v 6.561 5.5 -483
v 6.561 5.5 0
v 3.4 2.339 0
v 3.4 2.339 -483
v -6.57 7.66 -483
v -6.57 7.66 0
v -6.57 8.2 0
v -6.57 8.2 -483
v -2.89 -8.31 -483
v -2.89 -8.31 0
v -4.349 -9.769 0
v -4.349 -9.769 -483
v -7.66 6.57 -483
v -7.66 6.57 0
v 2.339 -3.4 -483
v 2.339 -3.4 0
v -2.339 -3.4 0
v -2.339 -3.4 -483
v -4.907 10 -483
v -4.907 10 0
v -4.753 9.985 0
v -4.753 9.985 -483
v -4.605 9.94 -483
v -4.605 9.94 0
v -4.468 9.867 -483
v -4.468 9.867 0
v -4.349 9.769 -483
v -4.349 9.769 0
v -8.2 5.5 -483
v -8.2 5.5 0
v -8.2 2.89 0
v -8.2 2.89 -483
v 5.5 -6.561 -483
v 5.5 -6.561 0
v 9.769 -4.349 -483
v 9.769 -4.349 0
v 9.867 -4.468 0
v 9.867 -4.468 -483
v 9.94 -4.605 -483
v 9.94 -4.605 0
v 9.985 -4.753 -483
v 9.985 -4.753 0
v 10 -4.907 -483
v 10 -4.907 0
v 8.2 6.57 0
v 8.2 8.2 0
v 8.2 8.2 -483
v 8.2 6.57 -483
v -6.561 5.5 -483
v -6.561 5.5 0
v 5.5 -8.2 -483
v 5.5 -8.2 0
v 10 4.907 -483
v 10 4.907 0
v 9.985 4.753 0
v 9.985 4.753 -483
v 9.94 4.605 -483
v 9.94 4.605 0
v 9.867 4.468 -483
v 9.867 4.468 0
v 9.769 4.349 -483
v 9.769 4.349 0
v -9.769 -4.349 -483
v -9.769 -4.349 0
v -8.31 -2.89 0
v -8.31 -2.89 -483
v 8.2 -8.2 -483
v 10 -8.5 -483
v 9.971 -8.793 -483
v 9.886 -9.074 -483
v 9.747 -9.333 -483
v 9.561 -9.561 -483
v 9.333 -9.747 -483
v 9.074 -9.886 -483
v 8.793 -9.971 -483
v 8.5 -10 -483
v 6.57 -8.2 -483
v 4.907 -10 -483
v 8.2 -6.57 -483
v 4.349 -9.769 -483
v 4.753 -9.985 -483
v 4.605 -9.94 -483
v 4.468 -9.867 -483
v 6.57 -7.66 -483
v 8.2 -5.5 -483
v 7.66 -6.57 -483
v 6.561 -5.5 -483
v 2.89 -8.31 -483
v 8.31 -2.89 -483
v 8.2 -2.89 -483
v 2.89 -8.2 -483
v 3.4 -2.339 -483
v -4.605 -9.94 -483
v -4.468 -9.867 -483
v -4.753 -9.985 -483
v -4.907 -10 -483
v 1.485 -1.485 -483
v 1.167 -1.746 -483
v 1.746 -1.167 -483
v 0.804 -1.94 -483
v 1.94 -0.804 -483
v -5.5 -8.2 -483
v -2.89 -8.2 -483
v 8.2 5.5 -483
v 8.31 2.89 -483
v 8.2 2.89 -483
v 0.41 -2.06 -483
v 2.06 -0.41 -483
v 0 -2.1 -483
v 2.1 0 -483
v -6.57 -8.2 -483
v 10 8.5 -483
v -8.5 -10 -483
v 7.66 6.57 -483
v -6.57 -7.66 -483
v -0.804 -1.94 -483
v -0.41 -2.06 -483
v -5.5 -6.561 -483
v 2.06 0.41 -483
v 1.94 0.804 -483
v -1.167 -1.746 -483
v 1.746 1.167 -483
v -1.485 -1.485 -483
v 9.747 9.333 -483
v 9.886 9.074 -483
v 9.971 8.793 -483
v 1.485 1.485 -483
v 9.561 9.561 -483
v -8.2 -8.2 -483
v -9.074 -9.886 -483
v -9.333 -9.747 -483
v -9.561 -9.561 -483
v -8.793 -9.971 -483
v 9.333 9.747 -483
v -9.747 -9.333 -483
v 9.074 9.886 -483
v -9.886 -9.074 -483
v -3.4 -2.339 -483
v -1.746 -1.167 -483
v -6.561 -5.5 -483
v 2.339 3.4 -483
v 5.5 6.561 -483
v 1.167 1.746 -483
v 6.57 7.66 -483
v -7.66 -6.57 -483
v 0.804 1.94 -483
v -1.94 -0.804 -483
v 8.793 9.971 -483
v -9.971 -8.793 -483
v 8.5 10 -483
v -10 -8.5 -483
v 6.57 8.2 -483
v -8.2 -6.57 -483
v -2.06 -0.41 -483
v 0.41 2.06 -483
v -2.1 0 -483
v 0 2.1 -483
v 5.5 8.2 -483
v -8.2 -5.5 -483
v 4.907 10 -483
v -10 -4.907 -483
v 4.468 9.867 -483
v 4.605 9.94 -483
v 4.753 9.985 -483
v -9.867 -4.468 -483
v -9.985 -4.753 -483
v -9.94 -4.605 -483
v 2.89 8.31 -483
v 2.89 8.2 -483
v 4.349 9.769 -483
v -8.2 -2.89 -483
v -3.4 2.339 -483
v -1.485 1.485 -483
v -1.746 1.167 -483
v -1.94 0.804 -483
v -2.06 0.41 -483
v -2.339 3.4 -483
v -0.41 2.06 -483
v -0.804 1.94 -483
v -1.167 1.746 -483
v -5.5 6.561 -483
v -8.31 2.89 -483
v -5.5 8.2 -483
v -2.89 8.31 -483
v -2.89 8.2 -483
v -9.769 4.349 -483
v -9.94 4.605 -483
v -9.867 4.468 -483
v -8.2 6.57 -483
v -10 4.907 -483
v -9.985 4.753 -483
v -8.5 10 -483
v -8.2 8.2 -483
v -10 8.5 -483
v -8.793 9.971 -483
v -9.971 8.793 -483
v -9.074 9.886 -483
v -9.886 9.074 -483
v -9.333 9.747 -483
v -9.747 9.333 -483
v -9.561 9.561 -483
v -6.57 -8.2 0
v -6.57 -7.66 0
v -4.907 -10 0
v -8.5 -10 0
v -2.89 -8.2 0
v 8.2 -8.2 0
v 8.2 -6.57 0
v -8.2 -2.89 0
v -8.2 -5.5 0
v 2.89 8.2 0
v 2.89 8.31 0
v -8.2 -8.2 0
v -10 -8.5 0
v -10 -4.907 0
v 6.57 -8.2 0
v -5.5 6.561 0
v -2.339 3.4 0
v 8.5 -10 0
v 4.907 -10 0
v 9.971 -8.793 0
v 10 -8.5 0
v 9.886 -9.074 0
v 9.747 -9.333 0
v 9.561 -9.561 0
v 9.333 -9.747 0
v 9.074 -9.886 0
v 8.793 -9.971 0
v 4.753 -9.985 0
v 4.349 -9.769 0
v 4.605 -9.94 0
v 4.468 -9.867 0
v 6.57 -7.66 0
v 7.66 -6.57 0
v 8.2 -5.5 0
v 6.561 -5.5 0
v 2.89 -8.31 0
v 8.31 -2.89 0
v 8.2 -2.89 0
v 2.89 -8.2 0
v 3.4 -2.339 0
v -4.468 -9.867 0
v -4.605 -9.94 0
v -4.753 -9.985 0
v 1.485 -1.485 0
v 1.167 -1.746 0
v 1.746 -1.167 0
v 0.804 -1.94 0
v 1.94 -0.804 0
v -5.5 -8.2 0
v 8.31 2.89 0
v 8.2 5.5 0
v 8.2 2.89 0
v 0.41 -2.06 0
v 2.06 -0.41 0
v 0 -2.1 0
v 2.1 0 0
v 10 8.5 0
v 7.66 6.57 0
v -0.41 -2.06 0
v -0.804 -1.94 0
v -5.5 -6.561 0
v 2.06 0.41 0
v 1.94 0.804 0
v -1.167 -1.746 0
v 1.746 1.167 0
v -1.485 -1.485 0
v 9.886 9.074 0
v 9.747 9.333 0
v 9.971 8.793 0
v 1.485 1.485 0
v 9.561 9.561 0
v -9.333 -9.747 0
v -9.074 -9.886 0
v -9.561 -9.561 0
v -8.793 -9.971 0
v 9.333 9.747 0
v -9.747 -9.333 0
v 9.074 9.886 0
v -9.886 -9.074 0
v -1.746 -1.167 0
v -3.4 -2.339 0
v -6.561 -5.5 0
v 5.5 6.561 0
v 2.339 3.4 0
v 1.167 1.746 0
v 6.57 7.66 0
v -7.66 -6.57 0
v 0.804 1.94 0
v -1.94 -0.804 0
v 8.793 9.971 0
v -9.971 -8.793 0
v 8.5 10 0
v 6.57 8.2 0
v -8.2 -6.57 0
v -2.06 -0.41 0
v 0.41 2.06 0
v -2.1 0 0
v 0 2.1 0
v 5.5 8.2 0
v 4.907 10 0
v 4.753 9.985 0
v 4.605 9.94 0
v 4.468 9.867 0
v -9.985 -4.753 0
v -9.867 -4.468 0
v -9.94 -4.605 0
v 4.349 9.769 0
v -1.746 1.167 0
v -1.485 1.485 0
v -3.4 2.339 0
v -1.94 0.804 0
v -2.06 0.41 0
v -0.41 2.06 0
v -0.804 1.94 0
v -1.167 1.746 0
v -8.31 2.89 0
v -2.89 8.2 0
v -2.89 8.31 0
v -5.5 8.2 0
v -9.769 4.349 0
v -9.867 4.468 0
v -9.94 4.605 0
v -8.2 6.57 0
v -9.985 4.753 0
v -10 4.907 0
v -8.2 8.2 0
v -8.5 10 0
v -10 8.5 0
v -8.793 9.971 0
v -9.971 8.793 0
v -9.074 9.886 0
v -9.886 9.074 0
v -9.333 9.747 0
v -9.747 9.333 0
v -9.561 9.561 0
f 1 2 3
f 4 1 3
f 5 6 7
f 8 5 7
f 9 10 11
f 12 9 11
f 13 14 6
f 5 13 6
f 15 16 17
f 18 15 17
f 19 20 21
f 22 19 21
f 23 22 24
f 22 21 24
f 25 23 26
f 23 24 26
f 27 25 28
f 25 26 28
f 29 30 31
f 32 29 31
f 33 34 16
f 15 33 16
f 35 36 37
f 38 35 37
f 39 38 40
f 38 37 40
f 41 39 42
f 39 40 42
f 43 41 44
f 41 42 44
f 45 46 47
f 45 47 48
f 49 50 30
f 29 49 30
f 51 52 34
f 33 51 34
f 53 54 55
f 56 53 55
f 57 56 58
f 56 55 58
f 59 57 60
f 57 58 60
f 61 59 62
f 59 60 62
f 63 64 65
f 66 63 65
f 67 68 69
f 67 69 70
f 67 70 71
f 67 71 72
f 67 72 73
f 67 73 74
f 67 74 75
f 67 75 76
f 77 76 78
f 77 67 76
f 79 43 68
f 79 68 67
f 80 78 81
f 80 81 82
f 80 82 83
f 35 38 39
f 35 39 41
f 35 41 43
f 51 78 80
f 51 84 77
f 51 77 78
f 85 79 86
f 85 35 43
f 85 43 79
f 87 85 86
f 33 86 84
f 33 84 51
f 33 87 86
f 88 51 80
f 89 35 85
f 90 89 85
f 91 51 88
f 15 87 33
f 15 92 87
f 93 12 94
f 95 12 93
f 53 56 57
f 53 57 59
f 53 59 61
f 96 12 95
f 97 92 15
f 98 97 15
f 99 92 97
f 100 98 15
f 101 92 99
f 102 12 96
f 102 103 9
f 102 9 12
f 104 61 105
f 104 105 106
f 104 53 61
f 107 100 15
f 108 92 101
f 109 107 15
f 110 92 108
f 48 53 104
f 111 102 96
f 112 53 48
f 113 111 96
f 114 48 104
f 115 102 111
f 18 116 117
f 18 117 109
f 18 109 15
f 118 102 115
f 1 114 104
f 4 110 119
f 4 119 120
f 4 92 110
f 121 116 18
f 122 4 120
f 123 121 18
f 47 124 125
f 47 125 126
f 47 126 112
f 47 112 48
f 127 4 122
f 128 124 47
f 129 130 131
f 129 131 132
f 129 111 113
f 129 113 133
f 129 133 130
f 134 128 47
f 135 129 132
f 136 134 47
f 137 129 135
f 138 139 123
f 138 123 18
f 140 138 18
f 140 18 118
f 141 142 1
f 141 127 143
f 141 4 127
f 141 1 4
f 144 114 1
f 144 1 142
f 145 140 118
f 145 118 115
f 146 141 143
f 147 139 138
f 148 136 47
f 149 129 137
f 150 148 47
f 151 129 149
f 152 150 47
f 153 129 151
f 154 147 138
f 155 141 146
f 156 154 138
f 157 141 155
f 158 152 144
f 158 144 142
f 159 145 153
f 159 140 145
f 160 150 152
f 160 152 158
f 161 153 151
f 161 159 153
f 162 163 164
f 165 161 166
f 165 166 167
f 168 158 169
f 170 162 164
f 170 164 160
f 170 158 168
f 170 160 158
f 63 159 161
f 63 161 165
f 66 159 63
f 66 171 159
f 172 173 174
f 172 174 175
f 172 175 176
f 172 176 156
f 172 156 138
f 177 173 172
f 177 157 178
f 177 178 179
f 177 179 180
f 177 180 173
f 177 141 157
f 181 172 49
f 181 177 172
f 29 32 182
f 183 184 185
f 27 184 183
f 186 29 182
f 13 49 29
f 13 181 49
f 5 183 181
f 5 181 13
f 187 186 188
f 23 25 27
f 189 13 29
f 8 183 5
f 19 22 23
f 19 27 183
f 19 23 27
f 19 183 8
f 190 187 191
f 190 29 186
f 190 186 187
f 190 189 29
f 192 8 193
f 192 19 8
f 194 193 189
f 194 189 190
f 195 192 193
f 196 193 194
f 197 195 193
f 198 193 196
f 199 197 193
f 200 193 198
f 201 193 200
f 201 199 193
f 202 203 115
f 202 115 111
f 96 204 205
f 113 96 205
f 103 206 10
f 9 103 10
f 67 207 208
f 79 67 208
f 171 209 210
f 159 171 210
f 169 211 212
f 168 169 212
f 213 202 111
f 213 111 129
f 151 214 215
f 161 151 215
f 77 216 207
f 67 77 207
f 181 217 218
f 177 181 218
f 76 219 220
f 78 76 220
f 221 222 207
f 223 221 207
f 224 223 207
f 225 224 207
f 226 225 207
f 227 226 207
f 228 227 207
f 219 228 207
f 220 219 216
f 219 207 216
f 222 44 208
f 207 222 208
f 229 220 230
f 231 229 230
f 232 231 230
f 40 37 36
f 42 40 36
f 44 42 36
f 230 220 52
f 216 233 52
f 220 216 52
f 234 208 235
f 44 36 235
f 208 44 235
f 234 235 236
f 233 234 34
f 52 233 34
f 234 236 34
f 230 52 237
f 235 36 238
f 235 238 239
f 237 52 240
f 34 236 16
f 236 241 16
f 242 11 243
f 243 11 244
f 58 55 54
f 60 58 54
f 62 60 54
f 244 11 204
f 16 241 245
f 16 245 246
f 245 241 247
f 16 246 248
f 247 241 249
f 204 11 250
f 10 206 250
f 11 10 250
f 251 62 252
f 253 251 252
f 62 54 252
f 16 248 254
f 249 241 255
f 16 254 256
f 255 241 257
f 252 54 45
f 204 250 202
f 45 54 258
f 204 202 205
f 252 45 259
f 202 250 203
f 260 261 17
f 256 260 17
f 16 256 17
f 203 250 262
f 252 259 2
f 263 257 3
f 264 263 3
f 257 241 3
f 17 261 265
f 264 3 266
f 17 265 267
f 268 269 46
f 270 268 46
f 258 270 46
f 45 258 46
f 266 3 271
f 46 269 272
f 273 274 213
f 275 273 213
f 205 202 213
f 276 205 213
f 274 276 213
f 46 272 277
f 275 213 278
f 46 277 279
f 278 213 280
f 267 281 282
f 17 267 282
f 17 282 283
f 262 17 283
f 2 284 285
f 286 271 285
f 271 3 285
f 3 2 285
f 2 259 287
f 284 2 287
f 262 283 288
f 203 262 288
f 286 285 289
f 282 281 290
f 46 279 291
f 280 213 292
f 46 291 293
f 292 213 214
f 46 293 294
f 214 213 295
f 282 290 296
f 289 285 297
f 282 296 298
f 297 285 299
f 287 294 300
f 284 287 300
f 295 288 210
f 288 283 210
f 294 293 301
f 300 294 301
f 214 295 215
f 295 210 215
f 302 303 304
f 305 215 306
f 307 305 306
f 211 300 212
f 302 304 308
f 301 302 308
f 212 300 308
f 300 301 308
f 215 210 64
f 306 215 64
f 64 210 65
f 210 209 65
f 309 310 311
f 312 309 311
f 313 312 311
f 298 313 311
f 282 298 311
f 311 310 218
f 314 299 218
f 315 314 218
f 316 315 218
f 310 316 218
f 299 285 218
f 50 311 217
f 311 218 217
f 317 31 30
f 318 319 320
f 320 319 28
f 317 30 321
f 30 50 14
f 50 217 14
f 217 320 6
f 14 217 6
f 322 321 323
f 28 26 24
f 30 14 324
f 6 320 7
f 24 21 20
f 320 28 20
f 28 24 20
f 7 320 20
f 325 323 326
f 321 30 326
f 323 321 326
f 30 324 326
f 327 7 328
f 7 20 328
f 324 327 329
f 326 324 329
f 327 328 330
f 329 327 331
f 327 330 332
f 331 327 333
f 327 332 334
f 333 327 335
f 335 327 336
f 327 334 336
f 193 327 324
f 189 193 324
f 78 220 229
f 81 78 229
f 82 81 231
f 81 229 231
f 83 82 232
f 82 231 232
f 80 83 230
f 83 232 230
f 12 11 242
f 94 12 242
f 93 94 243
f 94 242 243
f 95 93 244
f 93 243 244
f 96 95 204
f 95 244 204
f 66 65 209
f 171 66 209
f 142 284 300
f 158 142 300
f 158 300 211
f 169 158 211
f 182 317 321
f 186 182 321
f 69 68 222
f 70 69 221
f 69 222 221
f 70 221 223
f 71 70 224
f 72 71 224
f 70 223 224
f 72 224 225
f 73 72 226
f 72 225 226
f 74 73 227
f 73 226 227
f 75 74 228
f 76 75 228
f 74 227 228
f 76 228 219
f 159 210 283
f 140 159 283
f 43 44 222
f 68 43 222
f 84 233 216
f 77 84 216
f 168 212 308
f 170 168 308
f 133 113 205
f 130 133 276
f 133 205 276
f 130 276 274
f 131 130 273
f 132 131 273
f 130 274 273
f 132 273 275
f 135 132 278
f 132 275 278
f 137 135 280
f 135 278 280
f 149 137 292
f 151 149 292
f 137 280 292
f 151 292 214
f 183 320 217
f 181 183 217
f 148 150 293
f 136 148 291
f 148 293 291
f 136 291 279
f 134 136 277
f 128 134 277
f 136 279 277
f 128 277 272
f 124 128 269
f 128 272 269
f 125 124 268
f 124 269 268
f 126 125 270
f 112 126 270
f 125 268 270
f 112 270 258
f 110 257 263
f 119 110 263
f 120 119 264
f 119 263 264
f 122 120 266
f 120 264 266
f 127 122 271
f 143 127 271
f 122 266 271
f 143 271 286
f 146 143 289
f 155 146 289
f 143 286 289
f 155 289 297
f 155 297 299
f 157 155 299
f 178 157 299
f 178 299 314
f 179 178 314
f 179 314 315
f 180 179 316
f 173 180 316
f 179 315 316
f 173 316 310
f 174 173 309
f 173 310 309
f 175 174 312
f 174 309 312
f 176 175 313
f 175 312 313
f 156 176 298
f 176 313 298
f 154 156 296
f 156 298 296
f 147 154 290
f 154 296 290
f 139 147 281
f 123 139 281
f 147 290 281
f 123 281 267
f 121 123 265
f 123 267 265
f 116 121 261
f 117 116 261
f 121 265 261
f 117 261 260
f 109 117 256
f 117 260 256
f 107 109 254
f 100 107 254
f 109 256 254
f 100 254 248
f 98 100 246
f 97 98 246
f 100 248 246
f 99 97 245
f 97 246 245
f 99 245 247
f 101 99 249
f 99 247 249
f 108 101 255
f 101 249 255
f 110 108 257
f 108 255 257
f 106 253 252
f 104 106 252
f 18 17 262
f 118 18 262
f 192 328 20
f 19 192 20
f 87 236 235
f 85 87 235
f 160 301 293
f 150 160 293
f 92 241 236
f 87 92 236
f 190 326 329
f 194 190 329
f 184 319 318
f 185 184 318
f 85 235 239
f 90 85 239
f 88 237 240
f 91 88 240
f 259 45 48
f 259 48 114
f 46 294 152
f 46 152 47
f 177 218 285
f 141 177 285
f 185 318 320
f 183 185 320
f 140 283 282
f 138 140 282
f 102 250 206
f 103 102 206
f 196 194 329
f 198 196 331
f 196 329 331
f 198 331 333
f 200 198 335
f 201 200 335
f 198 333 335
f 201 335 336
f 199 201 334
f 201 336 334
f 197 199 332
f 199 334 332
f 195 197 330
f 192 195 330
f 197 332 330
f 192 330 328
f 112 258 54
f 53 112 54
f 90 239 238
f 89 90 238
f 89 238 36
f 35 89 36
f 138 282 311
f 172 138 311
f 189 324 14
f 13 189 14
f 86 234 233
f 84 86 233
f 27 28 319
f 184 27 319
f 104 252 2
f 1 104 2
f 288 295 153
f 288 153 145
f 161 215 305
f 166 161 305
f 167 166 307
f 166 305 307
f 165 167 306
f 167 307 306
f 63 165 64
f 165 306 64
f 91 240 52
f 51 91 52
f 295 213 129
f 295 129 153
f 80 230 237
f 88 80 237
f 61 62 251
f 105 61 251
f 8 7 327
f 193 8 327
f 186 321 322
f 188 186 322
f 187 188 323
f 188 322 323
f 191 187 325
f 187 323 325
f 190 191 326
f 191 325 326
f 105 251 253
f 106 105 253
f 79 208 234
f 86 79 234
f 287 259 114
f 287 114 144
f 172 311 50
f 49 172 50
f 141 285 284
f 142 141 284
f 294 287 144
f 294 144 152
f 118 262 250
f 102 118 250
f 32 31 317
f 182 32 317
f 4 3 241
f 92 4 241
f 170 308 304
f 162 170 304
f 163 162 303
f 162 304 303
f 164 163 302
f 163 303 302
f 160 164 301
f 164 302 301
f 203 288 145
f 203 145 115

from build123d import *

# Parameters (mm, degrees)
SKETCH6_R           = 2.1
BOSS_EXTRUDE1_DEPTH = 483


with BuildPart() as part:
    # Sketch6 → Boss-Extrude1 (new body)
    with BuildSketch(Plane.XY):
        with BuildLine():
            Line((-3.4, -2.339339828), (-3.4, 2.339339828))
            Line((-3.4, 2.339339828), (-6.560660172, 5.5))
            Line((-6.560660172, 5.5), (-8.2, 5.5))
            Line((-8.2, 5.5), (-8.2, 2.89))
            Line((-8.2, 2.89), (-8.31, 2.89))
            Line((-8.31, 2.89), (-9.768614357, 4.348614357))
            ThreePointArc((-9.768614357, 4.348614357), (-9.939864831, 4.604908803), (-10, 4.907228714))
            Line((-10, 4.907228714), (-10, 8.5))
            ThreePointArc((-10, 8.5), (-9.560660172, 9.560660172), (-8.5, 10))
            Line((-8.5, 10), (-4.907228714, 10))
            ThreePointArc((-4.907228714, 10), (-4.604908803, 9.939864831), (-4.348614357, 9.768614357))
            Line((-4.348614357, 9.768614357), (-2.89, 8.31))
            Line((-2.89, 8.31), (-2.89, 8.2))
            Line((-2.89, 8.2), (-5.5, 8.2))
            Line((-5.5, 8.2), (-5.5, 6.560660172))
            Line((-5.5, 6.560660172), (-2.339339828, 3.4))
            Line((-2.339339828, 3.4), (2.339339828, 3.4))
            Line((2.339339828, 3.4), (5.5, 6.560660172))
            Line((5.5, 6.560660172), (5.5, 8.2))
            Line((5.5, 8.2), (2.89, 8.2))
            Line((2.89, 8.2), (2.89, 8.31))
            Line((2.89, 8.31), (4.348614357, 9.768614357))
            ThreePointArc((4.348614357, 9.768614357), (4.604908803, 9.939864831), (4.907228714, 10))
            Line((4.907228714, 10), (8.5, 10))
            ThreePointArc((8.5, 10), (9.560660172, 9.560660172), (10, 8.5))
            Line((10, 8.5), (10, 4.907228714))
            ThreePointArc((10, 4.907228714), (9.939864831, 4.604908803), (9.768614357, 4.348614357))
            Line((9.768614357, 4.348614357), (8.31, 2.89))
            Line((8.31, 2.89), (8.2, 2.89))
            Line((8.2, 2.89), (8.2, 5.5))
            Line((8.2, 5.5), (6.560660172, 5.5))
            Line((6.560660172, 5.5), (3.4, 2.339339828))
            Line((3.4, 2.339339828), (3.4, -2.339339828))
            Line((3.4, -2.339339828), (6.560660172, -5.5))
            Line((6.560660172, -5.5), (8.2, -5.5))
            Line((8.2, -5.5), (8.2, -2.89))
            Line((8.2, -2.89), (8.31, -2.89))
            Line((8.31, -2.89), (9.768614357, -4.348614357))
            ThreePointArc((9.768614357, -4.348614357), (9.939864831, -4.604908803), (10, -4.907228714))
            Line((10, -4.907228714), (10, -8.5))
            ThreePointArc((10, -8.5), (9.560660172, -9.560660172), (8.5, -10))
            Line((8.5, -10), (4.907228714, -10))
            ThreePointArc((4.907228714, -10), (4.604908803, -9.939864831), (4.348614357, -9.768614357))
            Line((4.348614357, -9.768614357), (2.89, -8.31))
            Line((2.89, -8.31), (2.89, -8.2))
            Line((2.89, -8.2), (5.5, -8.2))
            Line((5.5, -8.2), (5.5, -6.560660172))
            Line((5.5, -6.560660172), (2.339339828, -3.4))
            Line((2.339339828, -3.4), (-2.339339828, -3.4))
            Line((-2.339339828, -3.4), (-5.5, -6.560660172))
            Line((-5.5, -6.560660172), (-5.5, -8.2))
            Line((-5.5, -8.2), (-2.89, -8.2))
            Line((-2.89, -8.2), (-2.89, -8.31))
            Line((-2.89, -8.31), (-4.348614357, -9.768614357))
            ThreePointArc((-4.348614357, -9.768614357), (-4.604908803, -9.939864831), (-4.907228714, -10))
            Line((-4.907228714, -10), (-8.5, -10))
            ThreePointArc((-8.5, -10), (-9.560660172, -9.560660172), (-10, -8.5))
            Line((-10, -8.5), (-10, -4.907228714))
            ThreePointArc((-10, -4.907228714), (-9.939864831, -4.604908803), (-9.768614357, -4.348614357))
            Line((-9.768614357, -4.348614357), (-8.31, -2.89))
            Line((-8.31, -2.89), (-8.2, -2.89))
            Line((-8.2, -2.89), (-8.2, -5.5))
            Line((-8.2, -5.5), (-6.560660172, -5.5))
            Line((-6.560660172, -5.5), (-3.4, -2.339339828))
        make_face()
        Circle(SKETCH6_R, mode=Mode.SUBTRACT)
        Polygon((-7.66, 6.57), (-6.57, 7.66), (-6.57, 8.2), (-8.2, 8.2), (-8.2, 6.57), align=None, mode=Mode.SUBTRACT)
        Polygon((8.2, 6.57), (7.66, 6.57), (6.57, 7.66), (6.57, 8.2), (8.2, 8.2), align=None, mode=Mode.SUBTRACT)
        Polygon((7.66, -6.57), (6.57, -7.66), (6.57, -8.2), (8.2, -8.2), (8.2, -6.57), align=None, mode=Mode.SUBTRACT)
        Polygon((-8.2, -6.57), (-7.66, -6.57), (-6.57, -7.66), (-6.57, -8.2), (-8.2, -8.2), align=None, mode=Mode.SUBTRACT)
    extrude(amount=-BOSS_EXTRUDE1_DEPTH)


solid = part.part
